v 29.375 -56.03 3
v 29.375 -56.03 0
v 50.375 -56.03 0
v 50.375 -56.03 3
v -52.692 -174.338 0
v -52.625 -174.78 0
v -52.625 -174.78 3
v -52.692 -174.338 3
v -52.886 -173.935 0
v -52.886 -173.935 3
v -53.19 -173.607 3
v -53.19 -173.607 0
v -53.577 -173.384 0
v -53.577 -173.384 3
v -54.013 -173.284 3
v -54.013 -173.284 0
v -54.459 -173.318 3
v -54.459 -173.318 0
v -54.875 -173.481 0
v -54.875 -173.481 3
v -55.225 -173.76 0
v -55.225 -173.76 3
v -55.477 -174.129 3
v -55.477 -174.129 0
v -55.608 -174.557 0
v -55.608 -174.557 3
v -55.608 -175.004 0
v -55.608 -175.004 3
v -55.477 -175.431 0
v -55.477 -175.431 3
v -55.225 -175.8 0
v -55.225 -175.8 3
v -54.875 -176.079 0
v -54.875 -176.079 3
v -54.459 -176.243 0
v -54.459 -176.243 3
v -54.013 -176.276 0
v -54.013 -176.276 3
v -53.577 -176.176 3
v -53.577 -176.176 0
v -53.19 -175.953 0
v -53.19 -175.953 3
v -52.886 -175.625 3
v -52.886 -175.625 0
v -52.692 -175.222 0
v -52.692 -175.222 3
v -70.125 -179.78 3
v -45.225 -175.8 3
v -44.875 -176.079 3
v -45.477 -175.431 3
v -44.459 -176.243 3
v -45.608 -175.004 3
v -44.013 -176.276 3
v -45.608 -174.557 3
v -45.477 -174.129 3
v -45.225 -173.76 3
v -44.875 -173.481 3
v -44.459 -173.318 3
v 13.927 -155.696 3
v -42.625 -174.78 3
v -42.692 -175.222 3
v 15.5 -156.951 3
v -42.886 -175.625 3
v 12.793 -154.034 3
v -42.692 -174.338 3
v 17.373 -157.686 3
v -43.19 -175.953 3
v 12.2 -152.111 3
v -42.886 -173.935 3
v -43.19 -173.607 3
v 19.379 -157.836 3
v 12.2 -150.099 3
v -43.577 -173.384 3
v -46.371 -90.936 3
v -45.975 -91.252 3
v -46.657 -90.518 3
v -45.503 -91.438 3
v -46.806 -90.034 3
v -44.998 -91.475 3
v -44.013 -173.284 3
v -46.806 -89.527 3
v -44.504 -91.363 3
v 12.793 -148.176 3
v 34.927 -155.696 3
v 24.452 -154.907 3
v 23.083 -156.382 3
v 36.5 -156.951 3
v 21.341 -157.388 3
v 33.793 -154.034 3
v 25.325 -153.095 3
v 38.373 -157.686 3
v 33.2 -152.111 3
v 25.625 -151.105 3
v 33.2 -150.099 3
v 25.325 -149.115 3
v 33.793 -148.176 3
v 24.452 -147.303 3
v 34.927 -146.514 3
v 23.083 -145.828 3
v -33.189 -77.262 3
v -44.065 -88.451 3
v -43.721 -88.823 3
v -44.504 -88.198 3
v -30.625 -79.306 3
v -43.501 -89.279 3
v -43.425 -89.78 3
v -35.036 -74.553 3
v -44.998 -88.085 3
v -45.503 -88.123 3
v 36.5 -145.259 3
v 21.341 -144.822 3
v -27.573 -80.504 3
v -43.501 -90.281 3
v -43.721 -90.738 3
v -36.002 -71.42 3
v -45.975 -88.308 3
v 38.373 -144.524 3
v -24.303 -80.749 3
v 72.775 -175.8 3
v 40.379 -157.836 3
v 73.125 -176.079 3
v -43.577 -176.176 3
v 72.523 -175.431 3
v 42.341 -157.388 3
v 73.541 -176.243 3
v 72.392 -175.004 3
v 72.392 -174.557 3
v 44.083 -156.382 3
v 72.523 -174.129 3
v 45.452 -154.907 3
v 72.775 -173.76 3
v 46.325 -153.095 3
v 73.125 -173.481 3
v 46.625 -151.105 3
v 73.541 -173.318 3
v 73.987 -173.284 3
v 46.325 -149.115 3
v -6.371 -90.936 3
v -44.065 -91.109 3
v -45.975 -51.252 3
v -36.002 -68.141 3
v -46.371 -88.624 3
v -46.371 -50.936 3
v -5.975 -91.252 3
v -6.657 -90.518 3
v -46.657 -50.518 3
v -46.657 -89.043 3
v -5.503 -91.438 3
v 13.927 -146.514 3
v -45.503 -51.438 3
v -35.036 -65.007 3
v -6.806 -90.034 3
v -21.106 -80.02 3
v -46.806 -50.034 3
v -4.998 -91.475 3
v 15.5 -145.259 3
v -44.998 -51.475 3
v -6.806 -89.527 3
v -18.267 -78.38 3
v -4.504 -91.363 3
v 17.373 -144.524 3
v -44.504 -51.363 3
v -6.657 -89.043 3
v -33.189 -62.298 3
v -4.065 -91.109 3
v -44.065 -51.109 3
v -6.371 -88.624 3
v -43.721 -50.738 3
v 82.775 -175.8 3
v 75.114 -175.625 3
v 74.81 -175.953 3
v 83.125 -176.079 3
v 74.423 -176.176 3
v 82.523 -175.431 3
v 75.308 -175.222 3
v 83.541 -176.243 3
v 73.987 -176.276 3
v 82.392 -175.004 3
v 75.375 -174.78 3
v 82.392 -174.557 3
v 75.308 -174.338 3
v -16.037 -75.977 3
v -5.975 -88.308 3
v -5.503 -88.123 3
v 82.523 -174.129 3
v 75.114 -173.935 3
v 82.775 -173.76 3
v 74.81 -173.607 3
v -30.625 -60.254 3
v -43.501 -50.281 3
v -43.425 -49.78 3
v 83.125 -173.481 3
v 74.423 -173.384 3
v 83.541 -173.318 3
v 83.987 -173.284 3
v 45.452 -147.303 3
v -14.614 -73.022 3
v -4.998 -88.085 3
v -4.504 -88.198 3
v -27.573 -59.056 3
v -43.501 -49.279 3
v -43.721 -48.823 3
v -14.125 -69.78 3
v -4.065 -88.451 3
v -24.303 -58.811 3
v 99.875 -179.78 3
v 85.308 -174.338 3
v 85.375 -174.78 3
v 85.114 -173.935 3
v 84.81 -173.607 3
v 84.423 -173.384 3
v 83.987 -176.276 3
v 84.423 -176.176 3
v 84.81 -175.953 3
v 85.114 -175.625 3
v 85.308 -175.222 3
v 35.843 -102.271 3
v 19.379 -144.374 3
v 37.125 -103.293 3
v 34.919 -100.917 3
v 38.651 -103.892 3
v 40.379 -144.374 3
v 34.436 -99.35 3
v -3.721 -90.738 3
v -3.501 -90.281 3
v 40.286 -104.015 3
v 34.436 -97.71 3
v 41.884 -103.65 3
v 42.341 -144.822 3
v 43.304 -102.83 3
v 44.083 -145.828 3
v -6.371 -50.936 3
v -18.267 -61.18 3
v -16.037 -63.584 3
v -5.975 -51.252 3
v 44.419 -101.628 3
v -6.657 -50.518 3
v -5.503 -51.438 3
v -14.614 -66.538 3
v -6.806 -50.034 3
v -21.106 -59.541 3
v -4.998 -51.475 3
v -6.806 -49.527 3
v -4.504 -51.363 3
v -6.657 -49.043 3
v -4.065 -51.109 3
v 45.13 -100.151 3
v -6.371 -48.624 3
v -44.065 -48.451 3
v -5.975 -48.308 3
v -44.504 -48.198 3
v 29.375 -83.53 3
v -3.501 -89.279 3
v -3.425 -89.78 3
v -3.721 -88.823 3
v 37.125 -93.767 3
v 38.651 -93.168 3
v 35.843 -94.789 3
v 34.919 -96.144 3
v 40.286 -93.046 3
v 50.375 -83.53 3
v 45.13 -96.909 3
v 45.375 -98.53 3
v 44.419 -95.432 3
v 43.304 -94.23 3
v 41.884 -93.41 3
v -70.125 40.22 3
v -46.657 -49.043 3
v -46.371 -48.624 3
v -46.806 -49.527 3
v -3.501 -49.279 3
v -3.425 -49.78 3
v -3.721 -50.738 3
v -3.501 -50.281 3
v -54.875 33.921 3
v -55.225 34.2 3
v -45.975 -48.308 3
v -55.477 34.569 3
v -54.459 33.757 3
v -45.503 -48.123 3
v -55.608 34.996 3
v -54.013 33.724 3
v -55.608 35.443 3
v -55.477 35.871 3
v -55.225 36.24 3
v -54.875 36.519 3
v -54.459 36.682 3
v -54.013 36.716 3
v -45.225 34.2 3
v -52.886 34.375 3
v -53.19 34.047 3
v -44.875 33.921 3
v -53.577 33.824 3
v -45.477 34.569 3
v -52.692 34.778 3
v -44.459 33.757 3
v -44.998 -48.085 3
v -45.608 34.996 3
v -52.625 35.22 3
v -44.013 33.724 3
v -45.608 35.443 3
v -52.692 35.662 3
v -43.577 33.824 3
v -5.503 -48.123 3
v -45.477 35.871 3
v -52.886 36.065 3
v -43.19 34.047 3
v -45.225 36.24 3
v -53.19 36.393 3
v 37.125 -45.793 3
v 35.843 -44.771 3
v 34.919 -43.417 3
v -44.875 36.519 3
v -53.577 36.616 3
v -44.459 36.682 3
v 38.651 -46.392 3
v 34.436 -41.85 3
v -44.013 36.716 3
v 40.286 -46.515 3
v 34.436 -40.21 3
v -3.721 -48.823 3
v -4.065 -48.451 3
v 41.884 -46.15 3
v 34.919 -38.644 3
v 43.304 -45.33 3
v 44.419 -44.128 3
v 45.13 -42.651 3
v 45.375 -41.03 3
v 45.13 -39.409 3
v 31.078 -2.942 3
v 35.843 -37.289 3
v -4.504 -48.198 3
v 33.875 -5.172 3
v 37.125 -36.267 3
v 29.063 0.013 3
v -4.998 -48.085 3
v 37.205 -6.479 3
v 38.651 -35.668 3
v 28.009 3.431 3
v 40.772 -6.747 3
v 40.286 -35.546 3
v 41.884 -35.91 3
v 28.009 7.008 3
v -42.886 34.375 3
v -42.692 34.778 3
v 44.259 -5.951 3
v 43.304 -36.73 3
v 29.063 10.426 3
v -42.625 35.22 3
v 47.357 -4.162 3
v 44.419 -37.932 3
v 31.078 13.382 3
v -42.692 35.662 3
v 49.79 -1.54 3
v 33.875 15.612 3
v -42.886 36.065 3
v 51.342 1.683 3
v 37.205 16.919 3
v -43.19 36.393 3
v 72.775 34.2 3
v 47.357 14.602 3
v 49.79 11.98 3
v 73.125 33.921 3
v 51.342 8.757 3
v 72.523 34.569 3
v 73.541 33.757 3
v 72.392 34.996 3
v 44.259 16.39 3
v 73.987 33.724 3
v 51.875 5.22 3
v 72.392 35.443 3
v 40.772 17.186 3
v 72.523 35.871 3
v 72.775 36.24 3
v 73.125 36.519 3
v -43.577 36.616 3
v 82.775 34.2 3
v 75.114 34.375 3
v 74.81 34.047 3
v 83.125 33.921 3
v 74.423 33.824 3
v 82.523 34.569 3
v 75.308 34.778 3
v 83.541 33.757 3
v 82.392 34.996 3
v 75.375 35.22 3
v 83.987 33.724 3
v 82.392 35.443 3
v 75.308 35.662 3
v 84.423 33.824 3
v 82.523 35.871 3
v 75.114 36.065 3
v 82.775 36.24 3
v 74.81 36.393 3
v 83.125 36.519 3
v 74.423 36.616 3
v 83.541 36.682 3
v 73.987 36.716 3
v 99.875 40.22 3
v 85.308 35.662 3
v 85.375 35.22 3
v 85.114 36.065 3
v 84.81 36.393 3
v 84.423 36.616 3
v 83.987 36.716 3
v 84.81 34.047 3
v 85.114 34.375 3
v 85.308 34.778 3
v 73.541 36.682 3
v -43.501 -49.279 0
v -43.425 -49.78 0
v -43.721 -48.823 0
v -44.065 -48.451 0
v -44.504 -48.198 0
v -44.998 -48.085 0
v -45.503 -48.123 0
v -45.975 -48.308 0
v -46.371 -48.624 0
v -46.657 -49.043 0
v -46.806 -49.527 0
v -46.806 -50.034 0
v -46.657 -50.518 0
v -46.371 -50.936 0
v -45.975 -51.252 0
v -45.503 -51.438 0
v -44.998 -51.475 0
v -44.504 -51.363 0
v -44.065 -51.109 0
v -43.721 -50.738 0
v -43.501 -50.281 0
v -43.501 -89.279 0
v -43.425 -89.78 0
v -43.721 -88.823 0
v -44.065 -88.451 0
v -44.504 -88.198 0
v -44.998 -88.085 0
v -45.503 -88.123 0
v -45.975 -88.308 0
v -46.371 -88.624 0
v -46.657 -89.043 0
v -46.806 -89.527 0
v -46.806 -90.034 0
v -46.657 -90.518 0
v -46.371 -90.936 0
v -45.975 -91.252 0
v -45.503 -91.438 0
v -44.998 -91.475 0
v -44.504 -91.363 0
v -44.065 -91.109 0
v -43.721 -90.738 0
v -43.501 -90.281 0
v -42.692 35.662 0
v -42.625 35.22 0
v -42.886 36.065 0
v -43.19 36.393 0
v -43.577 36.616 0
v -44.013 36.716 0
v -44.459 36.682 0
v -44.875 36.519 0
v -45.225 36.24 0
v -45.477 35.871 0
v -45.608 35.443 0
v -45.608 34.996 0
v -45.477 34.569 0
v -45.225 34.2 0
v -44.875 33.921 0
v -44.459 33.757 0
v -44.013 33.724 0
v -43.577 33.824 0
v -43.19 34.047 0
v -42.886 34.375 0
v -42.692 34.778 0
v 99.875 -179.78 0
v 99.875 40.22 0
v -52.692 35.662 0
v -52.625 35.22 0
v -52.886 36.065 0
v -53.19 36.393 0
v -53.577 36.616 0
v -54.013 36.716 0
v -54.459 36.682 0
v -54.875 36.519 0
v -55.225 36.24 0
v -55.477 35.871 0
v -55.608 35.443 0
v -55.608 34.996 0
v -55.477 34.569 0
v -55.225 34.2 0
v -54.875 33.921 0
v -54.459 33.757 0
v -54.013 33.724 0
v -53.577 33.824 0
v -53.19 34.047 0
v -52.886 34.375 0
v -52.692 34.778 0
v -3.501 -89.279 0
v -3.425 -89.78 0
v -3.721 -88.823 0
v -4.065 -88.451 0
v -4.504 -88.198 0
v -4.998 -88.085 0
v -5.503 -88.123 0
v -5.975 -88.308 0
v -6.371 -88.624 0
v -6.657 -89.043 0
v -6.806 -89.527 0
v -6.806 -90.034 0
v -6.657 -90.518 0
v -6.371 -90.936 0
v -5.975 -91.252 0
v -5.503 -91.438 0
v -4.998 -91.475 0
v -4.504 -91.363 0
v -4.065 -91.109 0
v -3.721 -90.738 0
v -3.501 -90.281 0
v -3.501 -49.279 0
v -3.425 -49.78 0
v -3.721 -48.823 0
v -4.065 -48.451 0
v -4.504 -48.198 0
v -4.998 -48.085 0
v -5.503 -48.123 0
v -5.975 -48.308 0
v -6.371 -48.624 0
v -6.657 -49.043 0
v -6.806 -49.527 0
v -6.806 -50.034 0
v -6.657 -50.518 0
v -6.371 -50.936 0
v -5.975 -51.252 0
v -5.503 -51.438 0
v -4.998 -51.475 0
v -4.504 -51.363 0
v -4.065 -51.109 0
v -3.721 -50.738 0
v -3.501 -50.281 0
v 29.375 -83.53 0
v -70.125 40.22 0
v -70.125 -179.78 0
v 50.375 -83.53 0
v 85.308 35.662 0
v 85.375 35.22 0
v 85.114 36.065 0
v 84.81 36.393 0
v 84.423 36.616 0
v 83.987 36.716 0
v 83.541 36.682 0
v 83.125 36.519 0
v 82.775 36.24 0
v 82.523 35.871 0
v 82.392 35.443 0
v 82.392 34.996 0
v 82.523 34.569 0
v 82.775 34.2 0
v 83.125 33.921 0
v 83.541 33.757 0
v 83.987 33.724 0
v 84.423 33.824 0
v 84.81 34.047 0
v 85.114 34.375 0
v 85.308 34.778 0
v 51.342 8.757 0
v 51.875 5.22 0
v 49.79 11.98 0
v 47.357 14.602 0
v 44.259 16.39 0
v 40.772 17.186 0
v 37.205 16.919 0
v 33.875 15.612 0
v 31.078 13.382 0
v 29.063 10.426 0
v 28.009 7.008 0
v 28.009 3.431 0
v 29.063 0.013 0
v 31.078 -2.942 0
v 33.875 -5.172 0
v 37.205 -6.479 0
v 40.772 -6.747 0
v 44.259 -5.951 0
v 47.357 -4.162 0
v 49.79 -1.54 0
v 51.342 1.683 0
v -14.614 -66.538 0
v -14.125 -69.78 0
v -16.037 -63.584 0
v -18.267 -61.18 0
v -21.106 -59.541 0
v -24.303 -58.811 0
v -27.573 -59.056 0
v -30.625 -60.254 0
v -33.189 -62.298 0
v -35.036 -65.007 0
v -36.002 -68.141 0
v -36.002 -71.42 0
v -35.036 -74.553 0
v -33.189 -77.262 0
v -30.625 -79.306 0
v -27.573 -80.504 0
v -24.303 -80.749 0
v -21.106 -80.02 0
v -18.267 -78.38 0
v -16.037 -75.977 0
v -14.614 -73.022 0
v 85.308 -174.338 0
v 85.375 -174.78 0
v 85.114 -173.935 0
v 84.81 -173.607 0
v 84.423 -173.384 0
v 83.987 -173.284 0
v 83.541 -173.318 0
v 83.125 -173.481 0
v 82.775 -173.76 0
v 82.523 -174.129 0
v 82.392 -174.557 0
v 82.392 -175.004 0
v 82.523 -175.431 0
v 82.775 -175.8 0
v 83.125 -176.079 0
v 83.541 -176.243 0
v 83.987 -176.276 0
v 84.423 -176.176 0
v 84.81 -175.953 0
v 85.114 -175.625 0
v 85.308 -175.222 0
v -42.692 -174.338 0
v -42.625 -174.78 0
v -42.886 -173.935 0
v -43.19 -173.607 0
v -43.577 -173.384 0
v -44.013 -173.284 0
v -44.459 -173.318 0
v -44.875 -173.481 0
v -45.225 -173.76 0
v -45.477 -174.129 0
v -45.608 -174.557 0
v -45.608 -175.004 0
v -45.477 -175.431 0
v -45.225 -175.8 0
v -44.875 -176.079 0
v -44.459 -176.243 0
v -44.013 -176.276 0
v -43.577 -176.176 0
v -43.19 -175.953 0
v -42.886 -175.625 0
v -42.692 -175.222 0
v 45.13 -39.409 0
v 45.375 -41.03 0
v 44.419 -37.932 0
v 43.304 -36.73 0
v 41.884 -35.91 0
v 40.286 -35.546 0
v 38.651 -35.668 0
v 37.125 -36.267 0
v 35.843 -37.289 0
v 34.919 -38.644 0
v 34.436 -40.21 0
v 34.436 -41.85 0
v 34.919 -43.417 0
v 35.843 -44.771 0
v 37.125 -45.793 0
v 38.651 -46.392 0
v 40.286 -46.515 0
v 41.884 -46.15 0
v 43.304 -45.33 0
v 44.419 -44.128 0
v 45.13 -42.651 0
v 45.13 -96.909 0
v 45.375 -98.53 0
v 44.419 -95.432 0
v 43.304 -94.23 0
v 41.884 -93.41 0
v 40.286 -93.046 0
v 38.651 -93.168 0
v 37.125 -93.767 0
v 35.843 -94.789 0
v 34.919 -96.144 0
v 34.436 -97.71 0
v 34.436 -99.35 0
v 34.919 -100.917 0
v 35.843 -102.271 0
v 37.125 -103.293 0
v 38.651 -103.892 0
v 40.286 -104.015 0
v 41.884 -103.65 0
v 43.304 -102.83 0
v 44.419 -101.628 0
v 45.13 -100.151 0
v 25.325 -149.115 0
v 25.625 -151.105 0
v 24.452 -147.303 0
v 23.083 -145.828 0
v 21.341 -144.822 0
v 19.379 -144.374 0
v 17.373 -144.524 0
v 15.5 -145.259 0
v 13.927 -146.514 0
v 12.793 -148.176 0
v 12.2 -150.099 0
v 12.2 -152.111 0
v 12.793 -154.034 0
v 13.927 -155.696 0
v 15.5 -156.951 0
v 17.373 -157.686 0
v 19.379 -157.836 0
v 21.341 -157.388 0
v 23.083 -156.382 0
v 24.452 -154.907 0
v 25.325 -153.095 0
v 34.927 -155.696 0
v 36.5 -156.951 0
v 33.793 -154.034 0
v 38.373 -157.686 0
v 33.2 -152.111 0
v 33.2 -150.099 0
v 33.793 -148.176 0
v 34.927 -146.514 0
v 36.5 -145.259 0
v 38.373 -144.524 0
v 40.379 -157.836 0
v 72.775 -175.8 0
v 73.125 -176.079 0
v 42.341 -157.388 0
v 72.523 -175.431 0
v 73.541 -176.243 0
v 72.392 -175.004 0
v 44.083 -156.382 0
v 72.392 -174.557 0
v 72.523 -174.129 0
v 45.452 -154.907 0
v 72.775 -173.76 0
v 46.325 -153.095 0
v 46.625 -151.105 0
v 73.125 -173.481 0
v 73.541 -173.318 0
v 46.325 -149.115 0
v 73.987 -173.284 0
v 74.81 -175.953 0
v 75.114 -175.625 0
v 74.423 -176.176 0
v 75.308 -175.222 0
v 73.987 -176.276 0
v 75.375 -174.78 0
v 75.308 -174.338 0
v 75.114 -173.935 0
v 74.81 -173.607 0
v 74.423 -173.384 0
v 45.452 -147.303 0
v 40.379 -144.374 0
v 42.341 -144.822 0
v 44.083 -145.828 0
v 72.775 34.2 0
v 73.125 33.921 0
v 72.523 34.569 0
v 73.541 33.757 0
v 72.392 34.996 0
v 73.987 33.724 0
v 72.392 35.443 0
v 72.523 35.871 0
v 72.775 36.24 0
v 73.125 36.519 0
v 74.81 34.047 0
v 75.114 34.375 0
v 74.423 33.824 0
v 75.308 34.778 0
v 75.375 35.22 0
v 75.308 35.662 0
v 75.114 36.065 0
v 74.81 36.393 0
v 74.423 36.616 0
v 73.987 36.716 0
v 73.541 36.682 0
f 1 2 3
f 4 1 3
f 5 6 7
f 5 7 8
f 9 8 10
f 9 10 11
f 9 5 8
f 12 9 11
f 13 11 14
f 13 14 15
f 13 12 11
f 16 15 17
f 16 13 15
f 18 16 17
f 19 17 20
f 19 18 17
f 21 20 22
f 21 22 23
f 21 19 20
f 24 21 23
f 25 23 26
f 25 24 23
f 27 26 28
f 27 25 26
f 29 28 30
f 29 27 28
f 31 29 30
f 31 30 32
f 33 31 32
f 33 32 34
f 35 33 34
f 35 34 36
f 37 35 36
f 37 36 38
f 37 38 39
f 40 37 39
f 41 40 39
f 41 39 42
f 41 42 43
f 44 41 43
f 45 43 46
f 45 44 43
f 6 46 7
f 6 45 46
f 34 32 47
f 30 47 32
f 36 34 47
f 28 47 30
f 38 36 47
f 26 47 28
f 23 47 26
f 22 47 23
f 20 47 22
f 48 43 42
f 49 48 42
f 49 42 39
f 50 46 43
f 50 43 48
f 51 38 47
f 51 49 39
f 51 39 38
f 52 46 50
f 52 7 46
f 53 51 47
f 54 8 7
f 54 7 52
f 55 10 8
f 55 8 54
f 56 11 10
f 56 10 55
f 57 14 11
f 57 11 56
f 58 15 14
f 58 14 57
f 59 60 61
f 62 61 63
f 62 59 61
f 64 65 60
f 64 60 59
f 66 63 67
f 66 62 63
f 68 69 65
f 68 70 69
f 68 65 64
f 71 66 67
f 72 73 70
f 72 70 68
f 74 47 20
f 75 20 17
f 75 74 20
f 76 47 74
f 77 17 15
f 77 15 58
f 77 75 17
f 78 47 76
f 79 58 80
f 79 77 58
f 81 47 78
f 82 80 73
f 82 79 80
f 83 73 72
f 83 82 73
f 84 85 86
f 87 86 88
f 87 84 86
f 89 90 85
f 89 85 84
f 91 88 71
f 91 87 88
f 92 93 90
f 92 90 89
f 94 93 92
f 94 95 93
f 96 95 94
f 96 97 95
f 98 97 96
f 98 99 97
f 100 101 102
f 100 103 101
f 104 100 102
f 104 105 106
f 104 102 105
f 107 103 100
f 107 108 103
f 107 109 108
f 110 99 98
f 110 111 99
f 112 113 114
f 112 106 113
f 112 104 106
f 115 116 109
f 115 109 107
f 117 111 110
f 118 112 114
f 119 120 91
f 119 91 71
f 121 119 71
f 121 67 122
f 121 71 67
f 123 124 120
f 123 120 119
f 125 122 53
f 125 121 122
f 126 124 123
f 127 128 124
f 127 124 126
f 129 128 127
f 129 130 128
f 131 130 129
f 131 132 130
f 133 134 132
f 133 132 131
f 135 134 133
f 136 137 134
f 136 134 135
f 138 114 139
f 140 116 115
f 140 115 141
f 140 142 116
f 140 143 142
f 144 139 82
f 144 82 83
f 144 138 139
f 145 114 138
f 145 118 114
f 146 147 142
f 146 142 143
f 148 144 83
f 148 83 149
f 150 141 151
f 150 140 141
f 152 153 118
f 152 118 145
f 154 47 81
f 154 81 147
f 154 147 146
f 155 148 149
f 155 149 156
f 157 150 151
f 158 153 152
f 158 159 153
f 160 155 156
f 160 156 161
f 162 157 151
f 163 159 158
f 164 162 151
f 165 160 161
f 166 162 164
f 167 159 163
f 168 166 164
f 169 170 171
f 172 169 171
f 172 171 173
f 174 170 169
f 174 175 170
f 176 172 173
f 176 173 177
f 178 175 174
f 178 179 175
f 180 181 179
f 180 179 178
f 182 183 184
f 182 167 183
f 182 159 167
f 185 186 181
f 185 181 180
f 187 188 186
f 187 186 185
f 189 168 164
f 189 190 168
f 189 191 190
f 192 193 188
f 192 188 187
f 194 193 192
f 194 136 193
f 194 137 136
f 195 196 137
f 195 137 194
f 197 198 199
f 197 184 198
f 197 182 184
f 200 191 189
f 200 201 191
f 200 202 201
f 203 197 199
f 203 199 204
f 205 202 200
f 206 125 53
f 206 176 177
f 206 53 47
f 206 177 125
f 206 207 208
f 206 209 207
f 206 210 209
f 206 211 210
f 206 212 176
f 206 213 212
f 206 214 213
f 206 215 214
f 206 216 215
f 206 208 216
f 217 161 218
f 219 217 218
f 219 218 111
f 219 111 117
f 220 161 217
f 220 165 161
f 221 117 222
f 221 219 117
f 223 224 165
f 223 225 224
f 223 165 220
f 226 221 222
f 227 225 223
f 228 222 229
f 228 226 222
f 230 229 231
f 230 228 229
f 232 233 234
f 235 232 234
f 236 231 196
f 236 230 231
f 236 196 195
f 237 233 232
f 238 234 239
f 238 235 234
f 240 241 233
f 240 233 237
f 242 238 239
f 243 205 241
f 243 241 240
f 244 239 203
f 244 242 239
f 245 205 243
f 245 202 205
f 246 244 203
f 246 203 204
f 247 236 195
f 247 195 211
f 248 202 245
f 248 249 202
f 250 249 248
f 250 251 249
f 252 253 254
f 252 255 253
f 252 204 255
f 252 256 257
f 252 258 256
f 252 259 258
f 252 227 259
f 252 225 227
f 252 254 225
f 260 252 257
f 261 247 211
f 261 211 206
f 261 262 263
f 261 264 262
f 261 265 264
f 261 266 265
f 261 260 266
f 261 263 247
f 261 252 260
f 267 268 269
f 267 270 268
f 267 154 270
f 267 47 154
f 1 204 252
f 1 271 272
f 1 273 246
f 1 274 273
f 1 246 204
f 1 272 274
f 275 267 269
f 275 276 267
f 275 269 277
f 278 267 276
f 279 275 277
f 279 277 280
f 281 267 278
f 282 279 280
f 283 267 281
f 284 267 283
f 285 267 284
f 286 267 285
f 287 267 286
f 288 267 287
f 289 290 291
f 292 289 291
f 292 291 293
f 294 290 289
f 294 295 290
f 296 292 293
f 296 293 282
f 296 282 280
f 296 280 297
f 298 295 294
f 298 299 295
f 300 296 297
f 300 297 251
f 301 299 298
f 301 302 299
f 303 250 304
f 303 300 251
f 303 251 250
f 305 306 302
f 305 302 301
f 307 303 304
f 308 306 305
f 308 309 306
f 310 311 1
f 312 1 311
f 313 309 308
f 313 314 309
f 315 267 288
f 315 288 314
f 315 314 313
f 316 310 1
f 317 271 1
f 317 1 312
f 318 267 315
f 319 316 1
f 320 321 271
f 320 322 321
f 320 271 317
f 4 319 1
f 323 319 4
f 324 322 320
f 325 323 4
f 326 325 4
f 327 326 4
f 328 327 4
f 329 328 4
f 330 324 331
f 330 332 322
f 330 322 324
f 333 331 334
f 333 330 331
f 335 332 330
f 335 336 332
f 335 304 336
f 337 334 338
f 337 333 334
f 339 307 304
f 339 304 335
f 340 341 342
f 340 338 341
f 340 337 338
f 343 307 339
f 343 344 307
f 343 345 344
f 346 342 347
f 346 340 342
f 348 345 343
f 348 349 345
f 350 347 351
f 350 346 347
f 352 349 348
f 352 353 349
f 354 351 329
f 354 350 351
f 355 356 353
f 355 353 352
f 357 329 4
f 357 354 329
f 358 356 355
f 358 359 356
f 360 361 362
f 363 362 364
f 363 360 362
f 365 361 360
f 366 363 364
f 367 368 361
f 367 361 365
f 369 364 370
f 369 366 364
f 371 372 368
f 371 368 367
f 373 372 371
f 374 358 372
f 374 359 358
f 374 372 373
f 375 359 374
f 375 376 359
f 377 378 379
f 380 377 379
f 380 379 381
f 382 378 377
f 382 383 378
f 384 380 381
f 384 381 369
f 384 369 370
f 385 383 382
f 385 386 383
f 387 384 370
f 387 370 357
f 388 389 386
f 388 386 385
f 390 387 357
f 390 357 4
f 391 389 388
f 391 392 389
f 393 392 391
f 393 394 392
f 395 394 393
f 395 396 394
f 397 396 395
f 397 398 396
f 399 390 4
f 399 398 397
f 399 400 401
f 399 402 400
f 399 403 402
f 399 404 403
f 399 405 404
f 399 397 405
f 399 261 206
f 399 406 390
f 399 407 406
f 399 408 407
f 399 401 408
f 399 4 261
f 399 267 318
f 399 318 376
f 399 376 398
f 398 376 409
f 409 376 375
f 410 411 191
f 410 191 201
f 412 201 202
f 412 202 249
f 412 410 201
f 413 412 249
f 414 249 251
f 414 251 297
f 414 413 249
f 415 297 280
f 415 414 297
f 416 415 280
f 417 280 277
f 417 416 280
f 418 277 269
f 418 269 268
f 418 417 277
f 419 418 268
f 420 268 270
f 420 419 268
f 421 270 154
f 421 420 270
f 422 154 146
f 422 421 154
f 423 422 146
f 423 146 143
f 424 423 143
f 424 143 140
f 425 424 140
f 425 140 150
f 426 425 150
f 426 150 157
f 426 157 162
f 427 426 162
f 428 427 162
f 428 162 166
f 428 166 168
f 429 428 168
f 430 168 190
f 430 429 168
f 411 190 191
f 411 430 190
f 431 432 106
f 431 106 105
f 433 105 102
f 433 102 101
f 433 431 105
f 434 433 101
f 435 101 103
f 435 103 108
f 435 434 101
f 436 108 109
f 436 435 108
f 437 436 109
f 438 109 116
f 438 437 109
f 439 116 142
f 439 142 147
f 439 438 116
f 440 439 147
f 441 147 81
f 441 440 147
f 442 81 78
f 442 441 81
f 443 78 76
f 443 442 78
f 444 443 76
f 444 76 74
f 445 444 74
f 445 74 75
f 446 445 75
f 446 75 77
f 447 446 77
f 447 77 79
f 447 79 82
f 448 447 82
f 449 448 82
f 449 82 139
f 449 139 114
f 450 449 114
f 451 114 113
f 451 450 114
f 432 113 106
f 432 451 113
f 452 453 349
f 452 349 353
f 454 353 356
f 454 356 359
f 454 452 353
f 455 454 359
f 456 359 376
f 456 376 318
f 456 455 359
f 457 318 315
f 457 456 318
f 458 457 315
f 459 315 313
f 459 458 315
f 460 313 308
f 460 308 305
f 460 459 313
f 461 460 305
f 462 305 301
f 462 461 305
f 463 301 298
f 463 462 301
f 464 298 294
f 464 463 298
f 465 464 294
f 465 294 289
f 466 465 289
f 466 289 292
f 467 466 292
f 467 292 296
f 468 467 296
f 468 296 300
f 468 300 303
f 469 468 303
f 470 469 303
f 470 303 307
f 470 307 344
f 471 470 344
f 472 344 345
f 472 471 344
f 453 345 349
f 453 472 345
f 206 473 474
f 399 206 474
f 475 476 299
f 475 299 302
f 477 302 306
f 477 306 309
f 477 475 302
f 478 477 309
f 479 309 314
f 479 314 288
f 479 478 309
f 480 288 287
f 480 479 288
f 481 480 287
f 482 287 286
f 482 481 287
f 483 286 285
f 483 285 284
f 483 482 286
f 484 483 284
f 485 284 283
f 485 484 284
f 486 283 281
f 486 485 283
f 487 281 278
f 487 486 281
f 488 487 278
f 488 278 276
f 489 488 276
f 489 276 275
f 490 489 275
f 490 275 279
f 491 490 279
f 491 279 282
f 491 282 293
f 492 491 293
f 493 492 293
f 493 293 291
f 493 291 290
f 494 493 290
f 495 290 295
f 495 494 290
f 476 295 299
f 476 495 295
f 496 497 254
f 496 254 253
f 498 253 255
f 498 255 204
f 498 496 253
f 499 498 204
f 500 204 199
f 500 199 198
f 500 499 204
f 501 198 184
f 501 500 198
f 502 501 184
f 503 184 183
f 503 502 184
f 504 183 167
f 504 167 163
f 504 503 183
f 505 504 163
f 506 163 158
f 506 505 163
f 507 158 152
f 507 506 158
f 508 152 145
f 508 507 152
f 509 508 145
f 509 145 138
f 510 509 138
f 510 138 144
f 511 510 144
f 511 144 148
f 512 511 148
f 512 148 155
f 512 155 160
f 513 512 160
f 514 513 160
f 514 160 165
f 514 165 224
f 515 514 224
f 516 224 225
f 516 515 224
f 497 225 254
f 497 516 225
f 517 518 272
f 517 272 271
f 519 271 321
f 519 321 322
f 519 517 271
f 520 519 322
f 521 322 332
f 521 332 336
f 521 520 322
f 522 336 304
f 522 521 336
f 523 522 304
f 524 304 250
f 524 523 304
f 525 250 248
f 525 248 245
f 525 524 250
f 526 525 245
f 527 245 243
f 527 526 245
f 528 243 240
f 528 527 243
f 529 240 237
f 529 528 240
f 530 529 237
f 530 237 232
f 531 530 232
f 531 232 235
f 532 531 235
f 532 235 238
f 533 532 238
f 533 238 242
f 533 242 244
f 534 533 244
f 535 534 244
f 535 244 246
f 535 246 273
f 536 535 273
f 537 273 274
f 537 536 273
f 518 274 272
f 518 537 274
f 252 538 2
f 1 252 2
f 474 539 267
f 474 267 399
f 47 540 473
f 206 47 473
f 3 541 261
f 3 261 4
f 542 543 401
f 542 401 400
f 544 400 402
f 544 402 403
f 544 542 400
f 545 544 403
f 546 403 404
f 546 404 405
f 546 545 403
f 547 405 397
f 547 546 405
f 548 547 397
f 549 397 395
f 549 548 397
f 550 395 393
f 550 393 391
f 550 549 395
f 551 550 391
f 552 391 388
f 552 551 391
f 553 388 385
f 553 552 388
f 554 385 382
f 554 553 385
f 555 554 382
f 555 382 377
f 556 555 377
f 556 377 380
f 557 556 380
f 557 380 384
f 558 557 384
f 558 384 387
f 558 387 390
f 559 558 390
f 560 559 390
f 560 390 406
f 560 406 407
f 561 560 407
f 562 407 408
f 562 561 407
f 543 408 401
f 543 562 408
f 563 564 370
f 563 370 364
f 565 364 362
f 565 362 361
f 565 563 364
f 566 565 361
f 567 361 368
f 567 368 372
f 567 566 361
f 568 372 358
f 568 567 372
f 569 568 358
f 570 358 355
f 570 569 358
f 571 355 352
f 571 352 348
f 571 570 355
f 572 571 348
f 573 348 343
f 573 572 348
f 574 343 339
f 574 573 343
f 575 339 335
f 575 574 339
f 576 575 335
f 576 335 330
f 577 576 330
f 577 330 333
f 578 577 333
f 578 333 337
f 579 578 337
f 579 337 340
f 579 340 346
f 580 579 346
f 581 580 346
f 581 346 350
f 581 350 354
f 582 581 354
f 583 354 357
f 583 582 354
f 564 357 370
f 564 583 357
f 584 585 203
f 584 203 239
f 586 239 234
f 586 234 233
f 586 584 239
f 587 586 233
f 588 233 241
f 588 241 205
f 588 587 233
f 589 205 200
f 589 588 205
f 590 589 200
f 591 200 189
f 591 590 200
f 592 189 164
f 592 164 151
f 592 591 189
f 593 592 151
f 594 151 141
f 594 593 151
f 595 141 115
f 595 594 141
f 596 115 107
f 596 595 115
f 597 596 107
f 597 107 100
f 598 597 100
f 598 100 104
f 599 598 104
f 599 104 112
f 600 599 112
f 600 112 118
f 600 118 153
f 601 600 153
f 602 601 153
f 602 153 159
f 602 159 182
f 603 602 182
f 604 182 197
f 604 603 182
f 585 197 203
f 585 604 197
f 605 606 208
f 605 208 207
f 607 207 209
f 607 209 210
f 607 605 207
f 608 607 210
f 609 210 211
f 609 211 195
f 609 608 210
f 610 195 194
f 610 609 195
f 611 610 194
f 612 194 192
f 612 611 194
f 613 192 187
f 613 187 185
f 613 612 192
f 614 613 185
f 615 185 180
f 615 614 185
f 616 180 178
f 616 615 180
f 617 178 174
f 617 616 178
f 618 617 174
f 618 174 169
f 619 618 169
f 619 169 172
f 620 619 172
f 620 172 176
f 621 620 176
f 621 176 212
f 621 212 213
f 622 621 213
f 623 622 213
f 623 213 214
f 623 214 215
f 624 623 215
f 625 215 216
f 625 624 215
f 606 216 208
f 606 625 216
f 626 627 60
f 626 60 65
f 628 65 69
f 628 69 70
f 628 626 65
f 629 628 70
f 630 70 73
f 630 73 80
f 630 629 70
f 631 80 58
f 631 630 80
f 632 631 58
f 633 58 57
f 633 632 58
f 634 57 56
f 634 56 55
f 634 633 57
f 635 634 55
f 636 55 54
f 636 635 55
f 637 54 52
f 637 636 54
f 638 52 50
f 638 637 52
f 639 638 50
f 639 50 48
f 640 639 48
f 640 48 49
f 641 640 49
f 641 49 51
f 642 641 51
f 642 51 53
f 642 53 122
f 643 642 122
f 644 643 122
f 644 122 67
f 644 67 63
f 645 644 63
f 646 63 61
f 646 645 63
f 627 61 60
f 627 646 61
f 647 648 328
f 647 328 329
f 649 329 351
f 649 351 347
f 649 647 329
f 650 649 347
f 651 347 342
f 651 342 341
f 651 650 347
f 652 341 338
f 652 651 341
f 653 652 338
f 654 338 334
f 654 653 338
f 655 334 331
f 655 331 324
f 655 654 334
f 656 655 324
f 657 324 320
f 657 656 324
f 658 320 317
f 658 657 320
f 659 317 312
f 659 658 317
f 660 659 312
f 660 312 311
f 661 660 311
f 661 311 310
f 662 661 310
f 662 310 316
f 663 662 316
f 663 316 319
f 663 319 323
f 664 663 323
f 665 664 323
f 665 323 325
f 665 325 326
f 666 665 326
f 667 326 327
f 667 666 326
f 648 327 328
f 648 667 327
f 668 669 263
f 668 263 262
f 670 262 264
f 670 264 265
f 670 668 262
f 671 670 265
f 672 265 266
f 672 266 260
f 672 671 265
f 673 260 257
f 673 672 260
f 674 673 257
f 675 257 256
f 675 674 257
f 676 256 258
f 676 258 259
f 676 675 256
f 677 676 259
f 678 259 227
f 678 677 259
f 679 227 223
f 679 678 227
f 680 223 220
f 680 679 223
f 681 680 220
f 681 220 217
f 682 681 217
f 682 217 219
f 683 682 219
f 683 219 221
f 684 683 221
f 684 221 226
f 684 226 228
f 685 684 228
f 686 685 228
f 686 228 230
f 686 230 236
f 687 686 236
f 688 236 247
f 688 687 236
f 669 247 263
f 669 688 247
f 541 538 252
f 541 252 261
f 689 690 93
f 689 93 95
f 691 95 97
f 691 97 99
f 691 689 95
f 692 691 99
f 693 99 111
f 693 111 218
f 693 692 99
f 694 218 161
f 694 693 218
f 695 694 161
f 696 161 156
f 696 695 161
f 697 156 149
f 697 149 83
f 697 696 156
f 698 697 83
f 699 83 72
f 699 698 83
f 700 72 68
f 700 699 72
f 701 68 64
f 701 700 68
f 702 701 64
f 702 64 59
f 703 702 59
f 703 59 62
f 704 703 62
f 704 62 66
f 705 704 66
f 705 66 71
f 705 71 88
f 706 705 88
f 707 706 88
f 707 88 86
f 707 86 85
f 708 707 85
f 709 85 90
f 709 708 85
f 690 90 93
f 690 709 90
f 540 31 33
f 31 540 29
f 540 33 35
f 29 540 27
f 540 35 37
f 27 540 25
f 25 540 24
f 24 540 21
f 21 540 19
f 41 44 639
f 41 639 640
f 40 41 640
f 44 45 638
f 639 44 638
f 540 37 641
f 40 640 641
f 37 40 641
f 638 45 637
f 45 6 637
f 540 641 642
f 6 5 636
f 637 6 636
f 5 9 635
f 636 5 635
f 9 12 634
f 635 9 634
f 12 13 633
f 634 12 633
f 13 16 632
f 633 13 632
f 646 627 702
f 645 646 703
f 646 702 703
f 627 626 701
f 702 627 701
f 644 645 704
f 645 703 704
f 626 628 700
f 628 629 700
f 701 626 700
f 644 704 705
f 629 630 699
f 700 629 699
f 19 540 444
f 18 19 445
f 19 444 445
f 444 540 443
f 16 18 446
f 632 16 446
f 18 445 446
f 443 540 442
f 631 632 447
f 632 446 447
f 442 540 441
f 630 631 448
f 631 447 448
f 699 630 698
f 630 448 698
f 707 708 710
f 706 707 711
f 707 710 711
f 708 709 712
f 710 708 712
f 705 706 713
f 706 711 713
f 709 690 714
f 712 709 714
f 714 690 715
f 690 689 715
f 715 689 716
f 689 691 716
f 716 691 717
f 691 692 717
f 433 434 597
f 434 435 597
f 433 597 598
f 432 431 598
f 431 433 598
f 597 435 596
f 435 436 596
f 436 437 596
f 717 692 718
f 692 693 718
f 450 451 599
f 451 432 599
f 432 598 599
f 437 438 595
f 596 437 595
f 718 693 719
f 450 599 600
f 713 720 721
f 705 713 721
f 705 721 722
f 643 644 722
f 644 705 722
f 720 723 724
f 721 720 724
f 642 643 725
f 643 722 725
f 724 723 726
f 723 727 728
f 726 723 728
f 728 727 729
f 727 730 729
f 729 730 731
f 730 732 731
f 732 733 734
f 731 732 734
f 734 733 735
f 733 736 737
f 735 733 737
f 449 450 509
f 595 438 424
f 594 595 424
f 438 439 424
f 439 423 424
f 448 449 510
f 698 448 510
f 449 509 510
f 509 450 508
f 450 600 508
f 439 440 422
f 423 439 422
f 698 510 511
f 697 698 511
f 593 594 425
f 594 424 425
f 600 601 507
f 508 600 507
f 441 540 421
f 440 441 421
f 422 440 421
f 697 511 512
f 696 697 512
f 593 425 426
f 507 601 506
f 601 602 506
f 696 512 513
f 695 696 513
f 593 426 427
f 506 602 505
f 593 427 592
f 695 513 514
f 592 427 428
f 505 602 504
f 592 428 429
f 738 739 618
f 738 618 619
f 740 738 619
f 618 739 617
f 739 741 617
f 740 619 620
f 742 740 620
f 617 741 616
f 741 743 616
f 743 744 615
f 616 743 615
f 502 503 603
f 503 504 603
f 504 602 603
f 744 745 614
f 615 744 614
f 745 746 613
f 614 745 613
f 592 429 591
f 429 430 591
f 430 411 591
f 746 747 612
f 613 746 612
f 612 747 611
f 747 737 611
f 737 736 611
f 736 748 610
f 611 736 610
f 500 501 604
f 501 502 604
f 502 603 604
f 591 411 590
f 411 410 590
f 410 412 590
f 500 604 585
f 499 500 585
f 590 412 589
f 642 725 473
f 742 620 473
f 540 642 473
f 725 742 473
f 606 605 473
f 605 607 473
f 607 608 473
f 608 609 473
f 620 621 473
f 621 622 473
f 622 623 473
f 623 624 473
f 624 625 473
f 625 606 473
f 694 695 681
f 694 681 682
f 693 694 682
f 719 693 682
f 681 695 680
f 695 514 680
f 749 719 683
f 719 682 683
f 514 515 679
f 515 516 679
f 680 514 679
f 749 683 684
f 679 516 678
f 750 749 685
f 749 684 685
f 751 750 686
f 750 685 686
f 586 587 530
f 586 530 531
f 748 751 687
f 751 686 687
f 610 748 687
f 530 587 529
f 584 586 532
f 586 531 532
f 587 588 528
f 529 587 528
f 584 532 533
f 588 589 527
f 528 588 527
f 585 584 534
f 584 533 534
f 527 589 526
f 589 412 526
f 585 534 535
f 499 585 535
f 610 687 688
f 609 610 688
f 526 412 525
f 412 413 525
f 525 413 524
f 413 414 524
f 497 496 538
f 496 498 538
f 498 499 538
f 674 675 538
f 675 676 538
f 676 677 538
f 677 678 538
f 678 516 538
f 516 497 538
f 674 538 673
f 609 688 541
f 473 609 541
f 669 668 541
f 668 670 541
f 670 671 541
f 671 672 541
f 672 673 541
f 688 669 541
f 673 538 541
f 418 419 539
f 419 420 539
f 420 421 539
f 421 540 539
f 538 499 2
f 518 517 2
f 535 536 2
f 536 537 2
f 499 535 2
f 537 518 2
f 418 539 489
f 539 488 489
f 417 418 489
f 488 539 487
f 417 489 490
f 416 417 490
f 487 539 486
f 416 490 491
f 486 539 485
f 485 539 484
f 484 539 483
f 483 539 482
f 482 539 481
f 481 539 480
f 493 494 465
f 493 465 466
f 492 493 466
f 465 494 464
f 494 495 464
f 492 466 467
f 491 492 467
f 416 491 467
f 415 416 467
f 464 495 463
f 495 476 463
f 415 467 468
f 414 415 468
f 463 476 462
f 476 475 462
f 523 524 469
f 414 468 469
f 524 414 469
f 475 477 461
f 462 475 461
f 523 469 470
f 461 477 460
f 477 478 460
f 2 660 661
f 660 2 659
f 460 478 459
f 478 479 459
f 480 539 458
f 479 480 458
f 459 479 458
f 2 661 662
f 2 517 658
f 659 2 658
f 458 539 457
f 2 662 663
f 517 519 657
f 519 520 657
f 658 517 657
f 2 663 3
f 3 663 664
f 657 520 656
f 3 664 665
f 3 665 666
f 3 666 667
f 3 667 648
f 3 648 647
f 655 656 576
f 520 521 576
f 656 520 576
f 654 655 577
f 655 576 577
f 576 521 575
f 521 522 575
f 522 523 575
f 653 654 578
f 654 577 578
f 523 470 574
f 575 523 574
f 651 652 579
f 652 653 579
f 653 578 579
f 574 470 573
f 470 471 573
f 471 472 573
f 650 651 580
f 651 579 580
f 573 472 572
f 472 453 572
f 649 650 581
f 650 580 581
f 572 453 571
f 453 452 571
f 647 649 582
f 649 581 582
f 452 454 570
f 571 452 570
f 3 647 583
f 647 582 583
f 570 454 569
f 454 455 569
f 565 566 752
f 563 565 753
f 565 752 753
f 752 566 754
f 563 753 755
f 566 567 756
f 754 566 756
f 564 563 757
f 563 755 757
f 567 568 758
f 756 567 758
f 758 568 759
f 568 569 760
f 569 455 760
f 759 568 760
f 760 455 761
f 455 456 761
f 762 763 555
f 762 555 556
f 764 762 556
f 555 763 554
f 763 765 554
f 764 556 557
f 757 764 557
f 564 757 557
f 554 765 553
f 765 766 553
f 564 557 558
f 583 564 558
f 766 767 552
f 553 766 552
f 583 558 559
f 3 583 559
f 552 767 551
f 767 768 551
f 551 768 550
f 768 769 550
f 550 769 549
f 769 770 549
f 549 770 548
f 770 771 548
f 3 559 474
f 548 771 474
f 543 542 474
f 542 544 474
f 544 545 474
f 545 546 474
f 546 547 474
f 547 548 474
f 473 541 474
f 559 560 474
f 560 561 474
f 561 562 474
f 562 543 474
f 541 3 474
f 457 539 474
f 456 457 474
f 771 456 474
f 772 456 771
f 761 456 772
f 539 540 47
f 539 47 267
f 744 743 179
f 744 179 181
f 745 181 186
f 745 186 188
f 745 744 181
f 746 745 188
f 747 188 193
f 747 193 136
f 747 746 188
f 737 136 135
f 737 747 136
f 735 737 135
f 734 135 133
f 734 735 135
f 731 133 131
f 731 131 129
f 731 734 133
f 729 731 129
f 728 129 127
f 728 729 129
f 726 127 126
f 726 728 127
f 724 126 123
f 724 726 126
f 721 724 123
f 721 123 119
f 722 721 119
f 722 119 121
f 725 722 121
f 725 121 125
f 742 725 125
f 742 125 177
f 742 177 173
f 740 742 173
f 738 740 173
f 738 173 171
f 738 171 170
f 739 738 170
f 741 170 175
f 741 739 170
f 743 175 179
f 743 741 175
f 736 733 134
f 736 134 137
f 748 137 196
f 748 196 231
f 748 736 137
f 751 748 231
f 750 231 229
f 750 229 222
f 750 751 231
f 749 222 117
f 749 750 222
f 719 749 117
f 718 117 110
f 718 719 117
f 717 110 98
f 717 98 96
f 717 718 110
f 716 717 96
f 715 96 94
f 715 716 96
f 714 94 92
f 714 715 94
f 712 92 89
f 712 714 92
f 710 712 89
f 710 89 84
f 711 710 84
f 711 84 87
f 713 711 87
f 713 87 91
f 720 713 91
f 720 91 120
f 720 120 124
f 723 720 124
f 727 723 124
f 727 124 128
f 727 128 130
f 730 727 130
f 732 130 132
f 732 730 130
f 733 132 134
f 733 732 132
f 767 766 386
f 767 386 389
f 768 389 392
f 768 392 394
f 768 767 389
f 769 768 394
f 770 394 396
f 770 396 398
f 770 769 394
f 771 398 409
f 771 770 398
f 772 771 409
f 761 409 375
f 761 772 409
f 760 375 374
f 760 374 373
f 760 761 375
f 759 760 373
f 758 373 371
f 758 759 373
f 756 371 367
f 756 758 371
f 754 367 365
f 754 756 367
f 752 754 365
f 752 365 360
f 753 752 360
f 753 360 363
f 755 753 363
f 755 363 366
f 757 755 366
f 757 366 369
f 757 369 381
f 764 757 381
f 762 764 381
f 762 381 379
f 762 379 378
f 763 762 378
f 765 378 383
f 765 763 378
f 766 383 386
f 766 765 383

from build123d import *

# Parameters (mm, degrees)
ESQUISSE1_W        = 170
ESQUISSE1_H        = 220
ESQUISSE1_R        = 11
ESQUISSE1_R_2      = 1.7
ESQUISSE1_R_3      = 1.5
ESQUISSE1_R_4      = 12
ESQUISSE1_R_5      = 5.5
ESQUISSE1_R_6      = 6.75
ESQUISSE1_W_2      = 21
ESQUISSE1_H_2      = 27.5
BOSS_EXTRU_1_DEPTH = 3


with BuildPart() as part:
    # Esquisse1 → Boss.-Extru.1 (new body)
    with BuildSketch(Plane.XY):
        with Locations((14.874803656, -69.780147352)):
            Rectangle(ESQUISSE1_W, ESQUISSE1_H)
        with Locations((-25.125196344, -69.780147352)):
            Circle(ESQUISSE1_R, mode=Mode.SUBTRACT)
        with Locations((-5.125196344, -89.780147352)):
            Circle(ESQUISSE1_R_2, mode=Mode.SUBTRACT)
        with Locations((-45.125196344, -89.780147352)):
            Circle(ESQUISSE1_R_2, mode=Mode.SUBTRACT)
        with Locations((-45.125196344, -49.780147352)):
            Circle(ESQUISSE1_R_2, mode=Mode.SUBTRACT)
        with Locations((-5.125196344, -49.780147352)):
            Circle(ESQUISSE1_R_2, mode=Mode.SUBTRACT)
        with Locations((83.874803656, -174.780147352)):
            Circle(ESQUISSE1_R_3, mode=Mode.SUBTRACT)
        with Locations((73.874803656, -174.780147352)):
            Circle(ESQUISSE1_R_3, mode=Mode.SUBTRACT)
        with Locations((83.874803656, 35.219852648)):
            Circle(ESQUISSE1_R_3, mode=Mode.SUBTRACT)
        with Locations((73.874803656, 35.219852648)):
            Circle(ESQUISSE1_R_3, mode=Mode.SUBTRACT)
        with Locations((-44.125196344, -174.780147352)):
            Circle(ESQUISSE1_R_3, mode=Mode.SUBTRACT)
        with Locations((-54.125196344, -174.780147352)):
            Circle(ESQUISSE1_R_3, mode=Mode.SUBTRACT)
        with Locations((-44.125196344, 35.219852648)):
            Circle(ESQUISSE1_R_3, mode=Mode.SUBTRACT)
        with Locations((-54.125196344, 35.219852648)):
            Circle(ESQUISSE1_R_3, mode=Mode.SUBTRACT)
        with Locations((39.874803656, 5.219852648)):
            Circle(ESQUISSE1_R_4, mode=Mode.SUBTRACT)
        with Locations((39.874803656, -41.030147352)):
            Circle(ESQUISSE1_R_5, mode=Mode.SUBTRACT)
        with Locations((39.874803656, -98.530147352)):
            Circle(ESQUISSE1_R_5, mode=Mode.SUBTRACT)
        with Locations((39.874803656, -151.105010126)):
            Circle(ESQUISSE1_R_6, mode=Mode.SUBTRACT)
        with Locations((18.874803656, -151.105010126)):
            Circle(ESQUISSE1_R_6, mode=Mode.SUBTRACT)
        with Locations((39.874803656, -69.780147352)):
            Rectangle(ESQUISSE1_W_2, ESQUISSE1_H_2, mode=Mode.SUBTRACT)
    extrude(amount=BOSS_EXTRU_1_DEPTH)


solid = part.part
